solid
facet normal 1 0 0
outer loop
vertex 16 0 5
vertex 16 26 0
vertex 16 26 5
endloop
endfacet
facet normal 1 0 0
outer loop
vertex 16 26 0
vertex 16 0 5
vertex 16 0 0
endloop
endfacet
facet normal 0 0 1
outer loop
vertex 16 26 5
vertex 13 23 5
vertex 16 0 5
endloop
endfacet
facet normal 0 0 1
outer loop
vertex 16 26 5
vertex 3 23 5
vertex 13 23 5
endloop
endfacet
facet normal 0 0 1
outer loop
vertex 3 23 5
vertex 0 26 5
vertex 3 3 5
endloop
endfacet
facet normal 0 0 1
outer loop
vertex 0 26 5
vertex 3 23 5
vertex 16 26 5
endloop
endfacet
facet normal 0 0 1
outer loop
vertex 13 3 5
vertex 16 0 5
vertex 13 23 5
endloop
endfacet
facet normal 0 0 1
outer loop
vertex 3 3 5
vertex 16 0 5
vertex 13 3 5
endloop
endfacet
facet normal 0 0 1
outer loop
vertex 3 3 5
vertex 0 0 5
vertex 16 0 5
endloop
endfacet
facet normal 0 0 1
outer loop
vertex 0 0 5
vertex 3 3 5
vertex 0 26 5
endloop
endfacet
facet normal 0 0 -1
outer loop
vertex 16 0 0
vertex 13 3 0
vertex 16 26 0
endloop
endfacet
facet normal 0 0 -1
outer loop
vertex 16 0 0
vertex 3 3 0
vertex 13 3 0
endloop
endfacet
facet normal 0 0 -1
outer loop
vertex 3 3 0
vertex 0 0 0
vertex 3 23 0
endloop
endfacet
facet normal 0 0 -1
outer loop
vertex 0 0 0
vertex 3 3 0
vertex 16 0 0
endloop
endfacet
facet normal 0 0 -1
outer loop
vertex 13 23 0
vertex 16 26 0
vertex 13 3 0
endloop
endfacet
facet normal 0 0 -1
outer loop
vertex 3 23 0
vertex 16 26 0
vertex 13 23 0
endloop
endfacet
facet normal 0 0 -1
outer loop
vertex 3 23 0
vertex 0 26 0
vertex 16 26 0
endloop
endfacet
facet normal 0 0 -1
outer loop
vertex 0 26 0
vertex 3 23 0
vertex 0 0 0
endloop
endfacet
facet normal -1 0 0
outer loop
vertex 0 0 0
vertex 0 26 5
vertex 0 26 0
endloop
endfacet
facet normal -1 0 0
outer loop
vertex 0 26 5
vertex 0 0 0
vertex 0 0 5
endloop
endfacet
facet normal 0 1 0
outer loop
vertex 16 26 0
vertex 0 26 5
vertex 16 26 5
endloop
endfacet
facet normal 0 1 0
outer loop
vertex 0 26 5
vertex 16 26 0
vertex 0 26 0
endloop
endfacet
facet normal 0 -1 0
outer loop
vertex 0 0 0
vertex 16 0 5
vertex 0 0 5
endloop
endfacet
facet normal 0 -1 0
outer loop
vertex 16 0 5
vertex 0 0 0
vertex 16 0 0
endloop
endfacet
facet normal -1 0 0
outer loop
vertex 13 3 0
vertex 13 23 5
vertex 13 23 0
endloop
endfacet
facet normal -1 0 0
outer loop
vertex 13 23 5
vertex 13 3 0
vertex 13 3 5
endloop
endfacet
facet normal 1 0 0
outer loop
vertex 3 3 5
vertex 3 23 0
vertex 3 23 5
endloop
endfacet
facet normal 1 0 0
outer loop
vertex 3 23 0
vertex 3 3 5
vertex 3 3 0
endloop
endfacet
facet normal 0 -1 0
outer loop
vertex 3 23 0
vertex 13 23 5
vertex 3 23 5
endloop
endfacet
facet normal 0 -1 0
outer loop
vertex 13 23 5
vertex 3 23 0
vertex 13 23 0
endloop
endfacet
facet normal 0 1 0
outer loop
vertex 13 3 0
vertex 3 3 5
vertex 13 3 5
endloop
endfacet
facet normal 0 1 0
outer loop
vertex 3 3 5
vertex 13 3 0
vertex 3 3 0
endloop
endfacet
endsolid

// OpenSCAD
l1=10;
l2=20;
w=3;
h=5;

difference() {
  cube([2*w+l1, 2*w+l2, h]);
  translate([w, w, -0.01]) cube([l1, l2, h+0.02]);
}
